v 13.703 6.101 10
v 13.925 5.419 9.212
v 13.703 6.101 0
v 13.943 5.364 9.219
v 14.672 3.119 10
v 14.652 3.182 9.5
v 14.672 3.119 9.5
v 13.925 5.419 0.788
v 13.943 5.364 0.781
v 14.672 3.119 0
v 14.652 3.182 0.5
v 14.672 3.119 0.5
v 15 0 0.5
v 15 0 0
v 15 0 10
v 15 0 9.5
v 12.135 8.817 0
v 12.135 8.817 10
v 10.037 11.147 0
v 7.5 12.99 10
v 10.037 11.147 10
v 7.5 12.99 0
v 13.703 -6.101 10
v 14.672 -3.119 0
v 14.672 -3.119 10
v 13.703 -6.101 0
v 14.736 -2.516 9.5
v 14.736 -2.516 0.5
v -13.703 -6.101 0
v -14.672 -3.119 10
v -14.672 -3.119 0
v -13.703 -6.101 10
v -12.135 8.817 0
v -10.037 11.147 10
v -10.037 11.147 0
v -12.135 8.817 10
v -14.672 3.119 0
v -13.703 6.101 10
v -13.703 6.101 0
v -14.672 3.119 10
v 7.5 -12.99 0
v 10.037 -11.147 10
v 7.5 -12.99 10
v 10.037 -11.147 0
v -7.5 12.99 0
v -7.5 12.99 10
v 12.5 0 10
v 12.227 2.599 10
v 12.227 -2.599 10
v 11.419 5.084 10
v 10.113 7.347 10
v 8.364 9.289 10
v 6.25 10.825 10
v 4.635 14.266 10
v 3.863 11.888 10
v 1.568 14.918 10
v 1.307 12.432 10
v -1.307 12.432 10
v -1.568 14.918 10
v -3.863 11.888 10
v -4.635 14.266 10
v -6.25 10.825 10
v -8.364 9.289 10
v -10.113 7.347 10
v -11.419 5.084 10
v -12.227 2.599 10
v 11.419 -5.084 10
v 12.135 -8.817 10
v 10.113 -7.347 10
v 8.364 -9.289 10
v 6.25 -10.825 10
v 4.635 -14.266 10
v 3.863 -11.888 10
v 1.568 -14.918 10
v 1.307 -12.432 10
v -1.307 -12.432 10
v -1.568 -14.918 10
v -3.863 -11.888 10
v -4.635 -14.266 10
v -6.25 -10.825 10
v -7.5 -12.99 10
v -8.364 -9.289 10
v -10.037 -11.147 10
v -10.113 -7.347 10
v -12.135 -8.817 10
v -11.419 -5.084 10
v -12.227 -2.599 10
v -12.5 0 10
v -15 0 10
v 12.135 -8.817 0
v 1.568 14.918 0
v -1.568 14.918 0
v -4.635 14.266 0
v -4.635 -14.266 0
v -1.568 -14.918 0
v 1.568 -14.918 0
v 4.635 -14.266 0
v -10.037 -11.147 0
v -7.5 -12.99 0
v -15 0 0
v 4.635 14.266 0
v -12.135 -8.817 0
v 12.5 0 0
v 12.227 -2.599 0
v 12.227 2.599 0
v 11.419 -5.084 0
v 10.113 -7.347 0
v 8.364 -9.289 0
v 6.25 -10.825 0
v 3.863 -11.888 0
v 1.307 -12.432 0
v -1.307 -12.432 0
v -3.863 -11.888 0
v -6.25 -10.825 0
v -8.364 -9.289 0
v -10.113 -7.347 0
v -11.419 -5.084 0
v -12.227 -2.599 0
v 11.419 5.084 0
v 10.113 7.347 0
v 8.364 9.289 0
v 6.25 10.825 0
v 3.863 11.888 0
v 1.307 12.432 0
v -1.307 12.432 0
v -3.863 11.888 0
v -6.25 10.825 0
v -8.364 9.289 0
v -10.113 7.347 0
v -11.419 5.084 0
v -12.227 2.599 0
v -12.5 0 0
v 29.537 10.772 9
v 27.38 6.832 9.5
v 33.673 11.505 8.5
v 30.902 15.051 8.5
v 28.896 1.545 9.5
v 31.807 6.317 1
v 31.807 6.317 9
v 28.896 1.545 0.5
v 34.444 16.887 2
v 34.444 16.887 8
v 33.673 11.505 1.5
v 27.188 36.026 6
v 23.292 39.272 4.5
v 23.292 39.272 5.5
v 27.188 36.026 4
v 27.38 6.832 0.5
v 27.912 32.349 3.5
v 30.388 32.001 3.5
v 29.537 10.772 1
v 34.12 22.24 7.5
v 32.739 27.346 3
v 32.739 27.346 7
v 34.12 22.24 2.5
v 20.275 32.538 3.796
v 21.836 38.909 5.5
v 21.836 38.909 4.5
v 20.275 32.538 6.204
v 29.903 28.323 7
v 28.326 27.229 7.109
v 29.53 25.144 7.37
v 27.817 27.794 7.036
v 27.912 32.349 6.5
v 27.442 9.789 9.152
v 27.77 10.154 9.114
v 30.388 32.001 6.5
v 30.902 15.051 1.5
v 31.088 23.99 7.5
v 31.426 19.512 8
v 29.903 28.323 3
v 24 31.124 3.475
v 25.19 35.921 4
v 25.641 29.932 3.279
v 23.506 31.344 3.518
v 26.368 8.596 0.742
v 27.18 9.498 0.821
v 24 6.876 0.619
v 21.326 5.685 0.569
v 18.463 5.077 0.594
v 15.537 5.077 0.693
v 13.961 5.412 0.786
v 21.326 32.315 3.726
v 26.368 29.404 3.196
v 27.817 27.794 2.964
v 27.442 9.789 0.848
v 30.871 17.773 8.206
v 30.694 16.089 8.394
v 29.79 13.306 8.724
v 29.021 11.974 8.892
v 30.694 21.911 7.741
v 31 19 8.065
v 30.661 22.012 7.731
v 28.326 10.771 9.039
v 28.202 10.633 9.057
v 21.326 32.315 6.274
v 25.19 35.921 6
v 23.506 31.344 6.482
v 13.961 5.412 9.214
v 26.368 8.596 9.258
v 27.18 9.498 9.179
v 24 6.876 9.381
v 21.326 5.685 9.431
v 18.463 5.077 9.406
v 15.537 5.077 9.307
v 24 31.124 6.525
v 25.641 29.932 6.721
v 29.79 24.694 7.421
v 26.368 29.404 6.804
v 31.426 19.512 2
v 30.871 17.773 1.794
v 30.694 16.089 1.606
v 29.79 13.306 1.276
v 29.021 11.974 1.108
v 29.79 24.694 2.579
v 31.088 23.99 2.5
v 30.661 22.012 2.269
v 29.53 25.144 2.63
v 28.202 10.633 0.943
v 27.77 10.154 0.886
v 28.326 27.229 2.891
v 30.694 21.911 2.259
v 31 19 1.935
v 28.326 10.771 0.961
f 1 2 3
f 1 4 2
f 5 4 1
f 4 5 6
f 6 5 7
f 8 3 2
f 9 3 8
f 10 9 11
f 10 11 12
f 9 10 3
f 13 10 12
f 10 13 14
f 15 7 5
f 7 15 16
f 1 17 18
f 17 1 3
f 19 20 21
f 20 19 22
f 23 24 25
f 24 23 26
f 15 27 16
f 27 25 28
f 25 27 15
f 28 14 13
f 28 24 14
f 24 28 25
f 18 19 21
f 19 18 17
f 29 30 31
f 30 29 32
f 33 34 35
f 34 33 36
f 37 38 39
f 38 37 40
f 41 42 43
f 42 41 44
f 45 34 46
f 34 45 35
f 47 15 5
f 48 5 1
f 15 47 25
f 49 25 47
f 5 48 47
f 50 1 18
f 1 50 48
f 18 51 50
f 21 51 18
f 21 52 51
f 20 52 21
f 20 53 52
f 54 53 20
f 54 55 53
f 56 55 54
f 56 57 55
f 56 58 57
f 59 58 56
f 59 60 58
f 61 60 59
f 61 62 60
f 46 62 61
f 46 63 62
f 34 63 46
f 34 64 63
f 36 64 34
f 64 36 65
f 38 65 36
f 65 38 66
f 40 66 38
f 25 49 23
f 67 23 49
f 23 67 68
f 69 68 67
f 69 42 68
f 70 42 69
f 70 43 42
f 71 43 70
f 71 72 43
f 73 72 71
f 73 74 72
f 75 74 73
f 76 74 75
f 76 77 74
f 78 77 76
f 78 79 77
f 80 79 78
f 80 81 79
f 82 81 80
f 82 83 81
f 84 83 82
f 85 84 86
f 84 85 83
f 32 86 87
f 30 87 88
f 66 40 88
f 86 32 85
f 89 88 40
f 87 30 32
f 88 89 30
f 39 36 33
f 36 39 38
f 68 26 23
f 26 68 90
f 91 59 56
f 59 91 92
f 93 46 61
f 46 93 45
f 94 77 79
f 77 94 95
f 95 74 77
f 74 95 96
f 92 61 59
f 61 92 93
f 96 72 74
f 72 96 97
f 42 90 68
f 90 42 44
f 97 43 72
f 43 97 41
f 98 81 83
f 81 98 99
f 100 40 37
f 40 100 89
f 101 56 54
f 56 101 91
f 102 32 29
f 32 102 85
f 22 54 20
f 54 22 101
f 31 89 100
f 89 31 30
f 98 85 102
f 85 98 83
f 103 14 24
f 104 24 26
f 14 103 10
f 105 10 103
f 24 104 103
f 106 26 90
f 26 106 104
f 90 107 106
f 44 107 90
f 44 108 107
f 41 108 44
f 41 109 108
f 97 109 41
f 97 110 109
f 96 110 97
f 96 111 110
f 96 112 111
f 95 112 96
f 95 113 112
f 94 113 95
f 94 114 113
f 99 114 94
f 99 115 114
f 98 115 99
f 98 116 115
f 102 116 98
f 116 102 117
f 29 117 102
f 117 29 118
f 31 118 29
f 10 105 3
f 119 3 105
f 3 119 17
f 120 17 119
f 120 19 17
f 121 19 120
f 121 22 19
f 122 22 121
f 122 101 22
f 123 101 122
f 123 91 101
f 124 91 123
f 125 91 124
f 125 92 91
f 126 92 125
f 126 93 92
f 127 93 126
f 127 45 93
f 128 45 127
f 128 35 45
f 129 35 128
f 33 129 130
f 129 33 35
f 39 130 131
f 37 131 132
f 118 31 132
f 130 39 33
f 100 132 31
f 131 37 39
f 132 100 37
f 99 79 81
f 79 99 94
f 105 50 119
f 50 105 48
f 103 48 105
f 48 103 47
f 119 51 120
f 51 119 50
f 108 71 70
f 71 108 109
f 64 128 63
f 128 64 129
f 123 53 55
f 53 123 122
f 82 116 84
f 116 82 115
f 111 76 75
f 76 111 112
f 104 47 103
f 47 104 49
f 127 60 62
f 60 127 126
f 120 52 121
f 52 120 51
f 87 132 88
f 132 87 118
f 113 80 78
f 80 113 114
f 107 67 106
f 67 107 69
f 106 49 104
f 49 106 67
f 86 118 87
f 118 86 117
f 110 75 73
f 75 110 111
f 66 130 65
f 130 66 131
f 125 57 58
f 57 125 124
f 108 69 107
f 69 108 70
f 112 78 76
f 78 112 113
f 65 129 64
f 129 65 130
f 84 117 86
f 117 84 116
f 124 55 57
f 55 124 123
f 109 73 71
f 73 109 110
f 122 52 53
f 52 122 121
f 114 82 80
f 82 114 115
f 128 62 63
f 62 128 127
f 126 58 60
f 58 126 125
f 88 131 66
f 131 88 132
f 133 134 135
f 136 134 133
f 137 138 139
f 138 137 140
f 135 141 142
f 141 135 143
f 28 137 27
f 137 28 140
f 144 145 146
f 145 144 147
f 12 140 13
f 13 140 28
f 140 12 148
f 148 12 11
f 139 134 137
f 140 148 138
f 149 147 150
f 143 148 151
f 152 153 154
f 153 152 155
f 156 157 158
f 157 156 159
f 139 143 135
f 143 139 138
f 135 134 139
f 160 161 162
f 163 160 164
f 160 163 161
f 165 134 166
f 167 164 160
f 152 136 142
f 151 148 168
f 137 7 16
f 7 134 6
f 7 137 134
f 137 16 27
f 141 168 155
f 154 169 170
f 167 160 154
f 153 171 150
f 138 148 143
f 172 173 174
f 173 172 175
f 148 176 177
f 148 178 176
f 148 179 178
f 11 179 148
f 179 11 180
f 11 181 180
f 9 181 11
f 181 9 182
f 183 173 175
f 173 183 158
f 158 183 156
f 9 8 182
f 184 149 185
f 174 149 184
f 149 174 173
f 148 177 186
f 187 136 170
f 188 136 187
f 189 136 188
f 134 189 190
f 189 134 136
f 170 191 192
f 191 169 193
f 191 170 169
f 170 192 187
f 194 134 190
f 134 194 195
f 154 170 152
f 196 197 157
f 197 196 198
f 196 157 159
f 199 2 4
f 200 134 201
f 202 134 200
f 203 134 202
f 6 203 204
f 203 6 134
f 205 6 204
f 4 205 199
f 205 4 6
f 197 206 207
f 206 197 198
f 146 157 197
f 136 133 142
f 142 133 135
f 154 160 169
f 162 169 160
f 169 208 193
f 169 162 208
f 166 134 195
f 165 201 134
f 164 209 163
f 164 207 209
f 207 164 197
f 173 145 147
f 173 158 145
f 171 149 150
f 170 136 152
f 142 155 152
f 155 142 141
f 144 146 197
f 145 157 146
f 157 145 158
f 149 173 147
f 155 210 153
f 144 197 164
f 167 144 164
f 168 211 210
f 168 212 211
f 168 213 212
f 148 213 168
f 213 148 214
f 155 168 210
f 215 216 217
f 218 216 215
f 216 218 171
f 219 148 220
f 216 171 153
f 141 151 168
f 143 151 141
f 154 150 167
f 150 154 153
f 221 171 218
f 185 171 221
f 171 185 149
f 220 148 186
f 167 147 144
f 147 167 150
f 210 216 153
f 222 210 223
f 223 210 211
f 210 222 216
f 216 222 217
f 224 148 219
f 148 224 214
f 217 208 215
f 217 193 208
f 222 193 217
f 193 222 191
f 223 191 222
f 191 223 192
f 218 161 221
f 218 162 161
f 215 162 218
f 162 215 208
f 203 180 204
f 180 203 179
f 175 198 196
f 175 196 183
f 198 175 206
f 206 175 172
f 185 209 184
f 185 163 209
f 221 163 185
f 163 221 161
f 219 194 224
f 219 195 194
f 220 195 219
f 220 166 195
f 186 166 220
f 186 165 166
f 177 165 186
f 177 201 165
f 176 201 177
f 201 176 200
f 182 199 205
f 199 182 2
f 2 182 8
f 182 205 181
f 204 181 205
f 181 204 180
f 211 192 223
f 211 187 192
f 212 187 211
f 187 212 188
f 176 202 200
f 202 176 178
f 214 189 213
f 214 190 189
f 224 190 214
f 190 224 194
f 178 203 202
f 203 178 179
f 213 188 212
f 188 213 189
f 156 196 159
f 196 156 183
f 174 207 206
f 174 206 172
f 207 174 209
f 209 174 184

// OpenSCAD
difference(){
cylinder(10,15,15);
cylinder(10,12.5,12.5);
}

difference(){
translate([8,20,0]) rotate([0,0,-85]) 
hull(){ 
for(i = [1 : 1 : 10]){
  rotate([0,0,i*11]) translate([18,0,0+i/2]) cube([6-i/2,15,10-i]);
}
}
translate([17,19,0])
cylinder(10,14,14);
}
